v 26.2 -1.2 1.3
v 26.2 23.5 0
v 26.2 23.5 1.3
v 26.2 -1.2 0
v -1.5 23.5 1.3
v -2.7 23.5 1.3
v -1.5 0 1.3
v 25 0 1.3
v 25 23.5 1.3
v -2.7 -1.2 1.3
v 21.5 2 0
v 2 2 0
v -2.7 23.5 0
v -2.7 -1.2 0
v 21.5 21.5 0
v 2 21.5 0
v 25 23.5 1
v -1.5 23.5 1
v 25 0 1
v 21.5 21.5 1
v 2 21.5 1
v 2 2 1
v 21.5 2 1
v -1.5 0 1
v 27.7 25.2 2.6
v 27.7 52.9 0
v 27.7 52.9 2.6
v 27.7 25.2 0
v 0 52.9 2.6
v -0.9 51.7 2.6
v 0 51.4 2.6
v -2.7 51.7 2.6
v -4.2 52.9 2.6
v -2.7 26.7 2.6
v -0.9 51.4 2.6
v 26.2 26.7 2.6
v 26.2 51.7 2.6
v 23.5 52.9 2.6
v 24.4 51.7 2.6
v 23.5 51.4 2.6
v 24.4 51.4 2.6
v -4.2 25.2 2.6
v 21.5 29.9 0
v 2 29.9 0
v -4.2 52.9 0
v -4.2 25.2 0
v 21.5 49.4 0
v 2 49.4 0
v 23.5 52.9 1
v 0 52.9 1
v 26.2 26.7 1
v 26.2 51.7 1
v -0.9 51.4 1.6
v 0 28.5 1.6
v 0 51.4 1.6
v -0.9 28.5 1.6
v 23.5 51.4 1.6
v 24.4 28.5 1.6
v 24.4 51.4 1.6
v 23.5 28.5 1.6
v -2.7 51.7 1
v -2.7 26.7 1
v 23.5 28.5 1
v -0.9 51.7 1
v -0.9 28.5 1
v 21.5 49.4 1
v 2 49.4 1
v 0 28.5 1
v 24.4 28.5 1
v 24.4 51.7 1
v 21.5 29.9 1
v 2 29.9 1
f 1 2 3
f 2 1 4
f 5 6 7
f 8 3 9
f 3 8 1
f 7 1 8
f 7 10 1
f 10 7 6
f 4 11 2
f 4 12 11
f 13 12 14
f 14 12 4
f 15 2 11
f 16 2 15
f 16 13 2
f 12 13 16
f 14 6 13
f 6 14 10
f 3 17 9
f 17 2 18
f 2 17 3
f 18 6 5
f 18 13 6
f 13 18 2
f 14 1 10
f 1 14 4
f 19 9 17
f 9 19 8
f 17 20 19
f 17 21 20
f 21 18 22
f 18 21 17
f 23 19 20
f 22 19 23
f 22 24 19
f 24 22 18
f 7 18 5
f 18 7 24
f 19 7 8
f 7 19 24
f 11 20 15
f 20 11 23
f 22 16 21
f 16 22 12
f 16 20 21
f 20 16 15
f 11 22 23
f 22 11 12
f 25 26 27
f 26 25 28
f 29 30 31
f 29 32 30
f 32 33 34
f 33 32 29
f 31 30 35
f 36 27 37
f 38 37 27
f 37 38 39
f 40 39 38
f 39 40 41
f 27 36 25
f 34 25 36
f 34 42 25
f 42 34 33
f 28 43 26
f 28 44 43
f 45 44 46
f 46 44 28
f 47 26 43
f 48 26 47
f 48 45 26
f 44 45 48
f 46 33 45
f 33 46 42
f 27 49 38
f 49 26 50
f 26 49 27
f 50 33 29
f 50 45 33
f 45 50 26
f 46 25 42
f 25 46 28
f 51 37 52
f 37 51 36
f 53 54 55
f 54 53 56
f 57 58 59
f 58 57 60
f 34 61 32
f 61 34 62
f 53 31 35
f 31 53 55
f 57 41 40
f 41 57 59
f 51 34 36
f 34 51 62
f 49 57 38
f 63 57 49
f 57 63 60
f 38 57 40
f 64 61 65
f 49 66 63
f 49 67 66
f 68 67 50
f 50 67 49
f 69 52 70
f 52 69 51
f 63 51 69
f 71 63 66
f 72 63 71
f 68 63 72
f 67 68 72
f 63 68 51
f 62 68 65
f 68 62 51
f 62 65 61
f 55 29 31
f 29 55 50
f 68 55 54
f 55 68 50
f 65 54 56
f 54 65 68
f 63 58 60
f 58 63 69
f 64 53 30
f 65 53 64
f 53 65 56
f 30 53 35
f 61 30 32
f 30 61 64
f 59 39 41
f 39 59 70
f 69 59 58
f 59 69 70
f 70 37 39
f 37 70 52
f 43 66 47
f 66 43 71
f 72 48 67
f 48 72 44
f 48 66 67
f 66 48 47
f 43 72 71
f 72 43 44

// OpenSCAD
//design and code by bioprint (http://www.thingiverse.com/bioprint)
//This code generates a holder for coverslip holder at SBC (customizable)
// 2015-02-02:	first design



// Size of nozzle
SizeOfNozzle = 0.4; // size of nozzle
// Bottom thickness
BottomThickness = 1; // 1 mm
// Wall thickness measured in layers
WallThicknessInLayers = 3; // number of layers (originally 2)
// Inner Skirt Width
InnerSkirtWidth = 2; // 2 mm

// Chamber Height
ChamberHeight = 0.6; // 0.6 mm (2 layers); Slicer: Z-layer: 0.3mm (first layer 0.4mm)
// ChamberWidth
ChamberWidth = 23.5; // 23 mm
// ChamberLength
ChamberLength = 23.5; // 23 mm


// Lid Tolerance
LidTolerance = 0.3; // 0.2 mm


// Round Holder Diameter
RoundHolderDiameter = 7; // 6 mm

// Round Holder Length
RoundHolderLength = 4; // 8 mm


// Washer Diameter
WasherDiameter = 13; // 1/2" 
// Washer Thickness
WasherThickness = 0.75; // 1.5 mm

// Holder Opening
HolderOpening = 10; // 9 mm

// Holder Wall Thickness In Layers
HolderWallThicknessInLayers = 4; // 3 

// HolderHeight
HolderHeight = WasherDiameter/2; // 


// BuildWidth
BuildWidth = 140; // 140 mm
// BuildLength
BuildLength = 140; // 140 mm
// Enable Multiple Device Printing
EnableMultipleDevicePrinting = 1;




WallThicknessInMM = WallThicknessInLayers*SizeOfNozzle;


LidXOffset = 0;
LidYOffset = ChamberLength + 2*WallThicknessInMM + InnerSkirtWidth; 

TopXOffset = 0;
TopYOffset = ChamberLength + 2*WallThicknessInMM + InnerSkirtWidth; 

// Holder Yoffset
HolderYOffset = ChamberLength/2;
HolderWallThicknessInLayersInMM = HolderWallThicknessInLayers * SizeOfNozzle;
HolderInsideColumn = WasherDiameter/2-2*LidTolerance;


// for multiplexing
XOffset = 0;
YOffset = 0;



MaxX = 0;
MaxY = 0;




		// bottom layer
		difference(){
			translate([XOffset-2*WallThicknessInMM - LidTolerance,-1*WallThicknessInMM,0]) 
				cube(size = [ChamberWidth + WallThicknessInMM * 4 + 2*LidTolerance,
								ChamberLength + WallThicknessInMM,
								BottomThickness + ChamberHeight-LidTolerance], center = false); // snaps better
			translate([XOffset-1*WallThicknessInMM - LidTolerance,0,BottomThickness]) 
				cube(size = [ChamberWidth + 2*WallThicknessInMM + 2*LidTolerance,
								ChamberLength+WallThicknessInMM * 2,
								ChamberHeight], center = false);
		
			translate([XOffset+InnerSkirtWidth,InnerSkirtWidth,0]) 
				cube(size = [ChamberWidth-2*InnerSkirtWidth,
								ChamberLength-2*InnerSkirtWidth,
								BottomThickness], center = false);
		
		}
		
		
		
		
		// top layer
		difference(){
			translate([XOffset-3*WallThicknessInMM-2*LidTolerance,
						  TopYOffset-2*WallThicknessInMM-LidTolerance,0]) 
				cube(size = [ChamberWidth + WallThicknessInMM * 6 + LidTolerance * 4,
								ChamberLength + WallThicknessInMM * 3 + LidTolerance * 2,
								BottomThickness + ChamberHeight + BottomThickness], center = false);
		
			translate([XOffset-2*WallThicknessInMM - LidTolerance,TopYOffset - WallThicknessInMM,BottomThickness+ChamberHeight]) 
				cube(size = [ChamberWidth+4*WallThicknessInMM+2*LidTolerance,
								ChamberLength+WallThicknessInMM,
								BottomThickness], center = false);
		
			translate([XOffset,TopYOffset - WallThicknessInMM,BottomThickness]) 
				cube(size = [ChamberWidth,
								ChamberLength+4*WallThicknessInMM,
								ChamberHeight+2*BottomThickness], center = false);
		
			translate([XOffset,TopYOffset - WallThicknessInMM,BottomThickness]) 
				cube(size = [ChamberWidth,
								ChamberLength+4*WallThicknessInMM,
								ChamberHeight+2*BottomThickness], center = false);
		
			translate([XOffset-2*WallThicknessInMM - LidTolerance,TopYOffset - WallThicknessInMM,BottomThickness]) 
				cube(size = [ChamberWidth+4*WallThicknessInMM+2*LidTolerance,
								WallThicknessInMM+2*LidTolerance,
								ChamberHeight+2*BottomThickness], center = false);
		
		
			translate([XOffset-2*WallThicknessInMM - LidTolerance,TopYOffset - WallThicknessInMM,BottomThickness]) 
				cube(size = [WallThicknessInMM+2*LidTolerance,			
								ChamberLength+WallThicknessInMM+LidTolerance,
								ChamberHeight+2*BottomThickness], center = false);
		
			translate([XOffset+ChamberWidth + WallThicknessInMM - LidTolerance,TopYOffset - WallThicknessInMM,BottomThickness]) 
				cube(size = [WallThicknessInMM+2*LidTolerance,			
								ChamberLength+WallThicknessInMM+LidTolerance,
								ChamberHeight+2*BottomThickness], center = false);
		
		// top opening
			translate([XOffset+InnerSkirtWidth,InnerSkirtWidth + TopYOffset,0]) 
				cube(size = [ChamberWidth-2*InnerSkirtWidth,
								ChamberLength-2*InnerSkirtWidth,
								ChamberHeight+2*BottomThickness], center = false);
		
		
		
		
		}
		

